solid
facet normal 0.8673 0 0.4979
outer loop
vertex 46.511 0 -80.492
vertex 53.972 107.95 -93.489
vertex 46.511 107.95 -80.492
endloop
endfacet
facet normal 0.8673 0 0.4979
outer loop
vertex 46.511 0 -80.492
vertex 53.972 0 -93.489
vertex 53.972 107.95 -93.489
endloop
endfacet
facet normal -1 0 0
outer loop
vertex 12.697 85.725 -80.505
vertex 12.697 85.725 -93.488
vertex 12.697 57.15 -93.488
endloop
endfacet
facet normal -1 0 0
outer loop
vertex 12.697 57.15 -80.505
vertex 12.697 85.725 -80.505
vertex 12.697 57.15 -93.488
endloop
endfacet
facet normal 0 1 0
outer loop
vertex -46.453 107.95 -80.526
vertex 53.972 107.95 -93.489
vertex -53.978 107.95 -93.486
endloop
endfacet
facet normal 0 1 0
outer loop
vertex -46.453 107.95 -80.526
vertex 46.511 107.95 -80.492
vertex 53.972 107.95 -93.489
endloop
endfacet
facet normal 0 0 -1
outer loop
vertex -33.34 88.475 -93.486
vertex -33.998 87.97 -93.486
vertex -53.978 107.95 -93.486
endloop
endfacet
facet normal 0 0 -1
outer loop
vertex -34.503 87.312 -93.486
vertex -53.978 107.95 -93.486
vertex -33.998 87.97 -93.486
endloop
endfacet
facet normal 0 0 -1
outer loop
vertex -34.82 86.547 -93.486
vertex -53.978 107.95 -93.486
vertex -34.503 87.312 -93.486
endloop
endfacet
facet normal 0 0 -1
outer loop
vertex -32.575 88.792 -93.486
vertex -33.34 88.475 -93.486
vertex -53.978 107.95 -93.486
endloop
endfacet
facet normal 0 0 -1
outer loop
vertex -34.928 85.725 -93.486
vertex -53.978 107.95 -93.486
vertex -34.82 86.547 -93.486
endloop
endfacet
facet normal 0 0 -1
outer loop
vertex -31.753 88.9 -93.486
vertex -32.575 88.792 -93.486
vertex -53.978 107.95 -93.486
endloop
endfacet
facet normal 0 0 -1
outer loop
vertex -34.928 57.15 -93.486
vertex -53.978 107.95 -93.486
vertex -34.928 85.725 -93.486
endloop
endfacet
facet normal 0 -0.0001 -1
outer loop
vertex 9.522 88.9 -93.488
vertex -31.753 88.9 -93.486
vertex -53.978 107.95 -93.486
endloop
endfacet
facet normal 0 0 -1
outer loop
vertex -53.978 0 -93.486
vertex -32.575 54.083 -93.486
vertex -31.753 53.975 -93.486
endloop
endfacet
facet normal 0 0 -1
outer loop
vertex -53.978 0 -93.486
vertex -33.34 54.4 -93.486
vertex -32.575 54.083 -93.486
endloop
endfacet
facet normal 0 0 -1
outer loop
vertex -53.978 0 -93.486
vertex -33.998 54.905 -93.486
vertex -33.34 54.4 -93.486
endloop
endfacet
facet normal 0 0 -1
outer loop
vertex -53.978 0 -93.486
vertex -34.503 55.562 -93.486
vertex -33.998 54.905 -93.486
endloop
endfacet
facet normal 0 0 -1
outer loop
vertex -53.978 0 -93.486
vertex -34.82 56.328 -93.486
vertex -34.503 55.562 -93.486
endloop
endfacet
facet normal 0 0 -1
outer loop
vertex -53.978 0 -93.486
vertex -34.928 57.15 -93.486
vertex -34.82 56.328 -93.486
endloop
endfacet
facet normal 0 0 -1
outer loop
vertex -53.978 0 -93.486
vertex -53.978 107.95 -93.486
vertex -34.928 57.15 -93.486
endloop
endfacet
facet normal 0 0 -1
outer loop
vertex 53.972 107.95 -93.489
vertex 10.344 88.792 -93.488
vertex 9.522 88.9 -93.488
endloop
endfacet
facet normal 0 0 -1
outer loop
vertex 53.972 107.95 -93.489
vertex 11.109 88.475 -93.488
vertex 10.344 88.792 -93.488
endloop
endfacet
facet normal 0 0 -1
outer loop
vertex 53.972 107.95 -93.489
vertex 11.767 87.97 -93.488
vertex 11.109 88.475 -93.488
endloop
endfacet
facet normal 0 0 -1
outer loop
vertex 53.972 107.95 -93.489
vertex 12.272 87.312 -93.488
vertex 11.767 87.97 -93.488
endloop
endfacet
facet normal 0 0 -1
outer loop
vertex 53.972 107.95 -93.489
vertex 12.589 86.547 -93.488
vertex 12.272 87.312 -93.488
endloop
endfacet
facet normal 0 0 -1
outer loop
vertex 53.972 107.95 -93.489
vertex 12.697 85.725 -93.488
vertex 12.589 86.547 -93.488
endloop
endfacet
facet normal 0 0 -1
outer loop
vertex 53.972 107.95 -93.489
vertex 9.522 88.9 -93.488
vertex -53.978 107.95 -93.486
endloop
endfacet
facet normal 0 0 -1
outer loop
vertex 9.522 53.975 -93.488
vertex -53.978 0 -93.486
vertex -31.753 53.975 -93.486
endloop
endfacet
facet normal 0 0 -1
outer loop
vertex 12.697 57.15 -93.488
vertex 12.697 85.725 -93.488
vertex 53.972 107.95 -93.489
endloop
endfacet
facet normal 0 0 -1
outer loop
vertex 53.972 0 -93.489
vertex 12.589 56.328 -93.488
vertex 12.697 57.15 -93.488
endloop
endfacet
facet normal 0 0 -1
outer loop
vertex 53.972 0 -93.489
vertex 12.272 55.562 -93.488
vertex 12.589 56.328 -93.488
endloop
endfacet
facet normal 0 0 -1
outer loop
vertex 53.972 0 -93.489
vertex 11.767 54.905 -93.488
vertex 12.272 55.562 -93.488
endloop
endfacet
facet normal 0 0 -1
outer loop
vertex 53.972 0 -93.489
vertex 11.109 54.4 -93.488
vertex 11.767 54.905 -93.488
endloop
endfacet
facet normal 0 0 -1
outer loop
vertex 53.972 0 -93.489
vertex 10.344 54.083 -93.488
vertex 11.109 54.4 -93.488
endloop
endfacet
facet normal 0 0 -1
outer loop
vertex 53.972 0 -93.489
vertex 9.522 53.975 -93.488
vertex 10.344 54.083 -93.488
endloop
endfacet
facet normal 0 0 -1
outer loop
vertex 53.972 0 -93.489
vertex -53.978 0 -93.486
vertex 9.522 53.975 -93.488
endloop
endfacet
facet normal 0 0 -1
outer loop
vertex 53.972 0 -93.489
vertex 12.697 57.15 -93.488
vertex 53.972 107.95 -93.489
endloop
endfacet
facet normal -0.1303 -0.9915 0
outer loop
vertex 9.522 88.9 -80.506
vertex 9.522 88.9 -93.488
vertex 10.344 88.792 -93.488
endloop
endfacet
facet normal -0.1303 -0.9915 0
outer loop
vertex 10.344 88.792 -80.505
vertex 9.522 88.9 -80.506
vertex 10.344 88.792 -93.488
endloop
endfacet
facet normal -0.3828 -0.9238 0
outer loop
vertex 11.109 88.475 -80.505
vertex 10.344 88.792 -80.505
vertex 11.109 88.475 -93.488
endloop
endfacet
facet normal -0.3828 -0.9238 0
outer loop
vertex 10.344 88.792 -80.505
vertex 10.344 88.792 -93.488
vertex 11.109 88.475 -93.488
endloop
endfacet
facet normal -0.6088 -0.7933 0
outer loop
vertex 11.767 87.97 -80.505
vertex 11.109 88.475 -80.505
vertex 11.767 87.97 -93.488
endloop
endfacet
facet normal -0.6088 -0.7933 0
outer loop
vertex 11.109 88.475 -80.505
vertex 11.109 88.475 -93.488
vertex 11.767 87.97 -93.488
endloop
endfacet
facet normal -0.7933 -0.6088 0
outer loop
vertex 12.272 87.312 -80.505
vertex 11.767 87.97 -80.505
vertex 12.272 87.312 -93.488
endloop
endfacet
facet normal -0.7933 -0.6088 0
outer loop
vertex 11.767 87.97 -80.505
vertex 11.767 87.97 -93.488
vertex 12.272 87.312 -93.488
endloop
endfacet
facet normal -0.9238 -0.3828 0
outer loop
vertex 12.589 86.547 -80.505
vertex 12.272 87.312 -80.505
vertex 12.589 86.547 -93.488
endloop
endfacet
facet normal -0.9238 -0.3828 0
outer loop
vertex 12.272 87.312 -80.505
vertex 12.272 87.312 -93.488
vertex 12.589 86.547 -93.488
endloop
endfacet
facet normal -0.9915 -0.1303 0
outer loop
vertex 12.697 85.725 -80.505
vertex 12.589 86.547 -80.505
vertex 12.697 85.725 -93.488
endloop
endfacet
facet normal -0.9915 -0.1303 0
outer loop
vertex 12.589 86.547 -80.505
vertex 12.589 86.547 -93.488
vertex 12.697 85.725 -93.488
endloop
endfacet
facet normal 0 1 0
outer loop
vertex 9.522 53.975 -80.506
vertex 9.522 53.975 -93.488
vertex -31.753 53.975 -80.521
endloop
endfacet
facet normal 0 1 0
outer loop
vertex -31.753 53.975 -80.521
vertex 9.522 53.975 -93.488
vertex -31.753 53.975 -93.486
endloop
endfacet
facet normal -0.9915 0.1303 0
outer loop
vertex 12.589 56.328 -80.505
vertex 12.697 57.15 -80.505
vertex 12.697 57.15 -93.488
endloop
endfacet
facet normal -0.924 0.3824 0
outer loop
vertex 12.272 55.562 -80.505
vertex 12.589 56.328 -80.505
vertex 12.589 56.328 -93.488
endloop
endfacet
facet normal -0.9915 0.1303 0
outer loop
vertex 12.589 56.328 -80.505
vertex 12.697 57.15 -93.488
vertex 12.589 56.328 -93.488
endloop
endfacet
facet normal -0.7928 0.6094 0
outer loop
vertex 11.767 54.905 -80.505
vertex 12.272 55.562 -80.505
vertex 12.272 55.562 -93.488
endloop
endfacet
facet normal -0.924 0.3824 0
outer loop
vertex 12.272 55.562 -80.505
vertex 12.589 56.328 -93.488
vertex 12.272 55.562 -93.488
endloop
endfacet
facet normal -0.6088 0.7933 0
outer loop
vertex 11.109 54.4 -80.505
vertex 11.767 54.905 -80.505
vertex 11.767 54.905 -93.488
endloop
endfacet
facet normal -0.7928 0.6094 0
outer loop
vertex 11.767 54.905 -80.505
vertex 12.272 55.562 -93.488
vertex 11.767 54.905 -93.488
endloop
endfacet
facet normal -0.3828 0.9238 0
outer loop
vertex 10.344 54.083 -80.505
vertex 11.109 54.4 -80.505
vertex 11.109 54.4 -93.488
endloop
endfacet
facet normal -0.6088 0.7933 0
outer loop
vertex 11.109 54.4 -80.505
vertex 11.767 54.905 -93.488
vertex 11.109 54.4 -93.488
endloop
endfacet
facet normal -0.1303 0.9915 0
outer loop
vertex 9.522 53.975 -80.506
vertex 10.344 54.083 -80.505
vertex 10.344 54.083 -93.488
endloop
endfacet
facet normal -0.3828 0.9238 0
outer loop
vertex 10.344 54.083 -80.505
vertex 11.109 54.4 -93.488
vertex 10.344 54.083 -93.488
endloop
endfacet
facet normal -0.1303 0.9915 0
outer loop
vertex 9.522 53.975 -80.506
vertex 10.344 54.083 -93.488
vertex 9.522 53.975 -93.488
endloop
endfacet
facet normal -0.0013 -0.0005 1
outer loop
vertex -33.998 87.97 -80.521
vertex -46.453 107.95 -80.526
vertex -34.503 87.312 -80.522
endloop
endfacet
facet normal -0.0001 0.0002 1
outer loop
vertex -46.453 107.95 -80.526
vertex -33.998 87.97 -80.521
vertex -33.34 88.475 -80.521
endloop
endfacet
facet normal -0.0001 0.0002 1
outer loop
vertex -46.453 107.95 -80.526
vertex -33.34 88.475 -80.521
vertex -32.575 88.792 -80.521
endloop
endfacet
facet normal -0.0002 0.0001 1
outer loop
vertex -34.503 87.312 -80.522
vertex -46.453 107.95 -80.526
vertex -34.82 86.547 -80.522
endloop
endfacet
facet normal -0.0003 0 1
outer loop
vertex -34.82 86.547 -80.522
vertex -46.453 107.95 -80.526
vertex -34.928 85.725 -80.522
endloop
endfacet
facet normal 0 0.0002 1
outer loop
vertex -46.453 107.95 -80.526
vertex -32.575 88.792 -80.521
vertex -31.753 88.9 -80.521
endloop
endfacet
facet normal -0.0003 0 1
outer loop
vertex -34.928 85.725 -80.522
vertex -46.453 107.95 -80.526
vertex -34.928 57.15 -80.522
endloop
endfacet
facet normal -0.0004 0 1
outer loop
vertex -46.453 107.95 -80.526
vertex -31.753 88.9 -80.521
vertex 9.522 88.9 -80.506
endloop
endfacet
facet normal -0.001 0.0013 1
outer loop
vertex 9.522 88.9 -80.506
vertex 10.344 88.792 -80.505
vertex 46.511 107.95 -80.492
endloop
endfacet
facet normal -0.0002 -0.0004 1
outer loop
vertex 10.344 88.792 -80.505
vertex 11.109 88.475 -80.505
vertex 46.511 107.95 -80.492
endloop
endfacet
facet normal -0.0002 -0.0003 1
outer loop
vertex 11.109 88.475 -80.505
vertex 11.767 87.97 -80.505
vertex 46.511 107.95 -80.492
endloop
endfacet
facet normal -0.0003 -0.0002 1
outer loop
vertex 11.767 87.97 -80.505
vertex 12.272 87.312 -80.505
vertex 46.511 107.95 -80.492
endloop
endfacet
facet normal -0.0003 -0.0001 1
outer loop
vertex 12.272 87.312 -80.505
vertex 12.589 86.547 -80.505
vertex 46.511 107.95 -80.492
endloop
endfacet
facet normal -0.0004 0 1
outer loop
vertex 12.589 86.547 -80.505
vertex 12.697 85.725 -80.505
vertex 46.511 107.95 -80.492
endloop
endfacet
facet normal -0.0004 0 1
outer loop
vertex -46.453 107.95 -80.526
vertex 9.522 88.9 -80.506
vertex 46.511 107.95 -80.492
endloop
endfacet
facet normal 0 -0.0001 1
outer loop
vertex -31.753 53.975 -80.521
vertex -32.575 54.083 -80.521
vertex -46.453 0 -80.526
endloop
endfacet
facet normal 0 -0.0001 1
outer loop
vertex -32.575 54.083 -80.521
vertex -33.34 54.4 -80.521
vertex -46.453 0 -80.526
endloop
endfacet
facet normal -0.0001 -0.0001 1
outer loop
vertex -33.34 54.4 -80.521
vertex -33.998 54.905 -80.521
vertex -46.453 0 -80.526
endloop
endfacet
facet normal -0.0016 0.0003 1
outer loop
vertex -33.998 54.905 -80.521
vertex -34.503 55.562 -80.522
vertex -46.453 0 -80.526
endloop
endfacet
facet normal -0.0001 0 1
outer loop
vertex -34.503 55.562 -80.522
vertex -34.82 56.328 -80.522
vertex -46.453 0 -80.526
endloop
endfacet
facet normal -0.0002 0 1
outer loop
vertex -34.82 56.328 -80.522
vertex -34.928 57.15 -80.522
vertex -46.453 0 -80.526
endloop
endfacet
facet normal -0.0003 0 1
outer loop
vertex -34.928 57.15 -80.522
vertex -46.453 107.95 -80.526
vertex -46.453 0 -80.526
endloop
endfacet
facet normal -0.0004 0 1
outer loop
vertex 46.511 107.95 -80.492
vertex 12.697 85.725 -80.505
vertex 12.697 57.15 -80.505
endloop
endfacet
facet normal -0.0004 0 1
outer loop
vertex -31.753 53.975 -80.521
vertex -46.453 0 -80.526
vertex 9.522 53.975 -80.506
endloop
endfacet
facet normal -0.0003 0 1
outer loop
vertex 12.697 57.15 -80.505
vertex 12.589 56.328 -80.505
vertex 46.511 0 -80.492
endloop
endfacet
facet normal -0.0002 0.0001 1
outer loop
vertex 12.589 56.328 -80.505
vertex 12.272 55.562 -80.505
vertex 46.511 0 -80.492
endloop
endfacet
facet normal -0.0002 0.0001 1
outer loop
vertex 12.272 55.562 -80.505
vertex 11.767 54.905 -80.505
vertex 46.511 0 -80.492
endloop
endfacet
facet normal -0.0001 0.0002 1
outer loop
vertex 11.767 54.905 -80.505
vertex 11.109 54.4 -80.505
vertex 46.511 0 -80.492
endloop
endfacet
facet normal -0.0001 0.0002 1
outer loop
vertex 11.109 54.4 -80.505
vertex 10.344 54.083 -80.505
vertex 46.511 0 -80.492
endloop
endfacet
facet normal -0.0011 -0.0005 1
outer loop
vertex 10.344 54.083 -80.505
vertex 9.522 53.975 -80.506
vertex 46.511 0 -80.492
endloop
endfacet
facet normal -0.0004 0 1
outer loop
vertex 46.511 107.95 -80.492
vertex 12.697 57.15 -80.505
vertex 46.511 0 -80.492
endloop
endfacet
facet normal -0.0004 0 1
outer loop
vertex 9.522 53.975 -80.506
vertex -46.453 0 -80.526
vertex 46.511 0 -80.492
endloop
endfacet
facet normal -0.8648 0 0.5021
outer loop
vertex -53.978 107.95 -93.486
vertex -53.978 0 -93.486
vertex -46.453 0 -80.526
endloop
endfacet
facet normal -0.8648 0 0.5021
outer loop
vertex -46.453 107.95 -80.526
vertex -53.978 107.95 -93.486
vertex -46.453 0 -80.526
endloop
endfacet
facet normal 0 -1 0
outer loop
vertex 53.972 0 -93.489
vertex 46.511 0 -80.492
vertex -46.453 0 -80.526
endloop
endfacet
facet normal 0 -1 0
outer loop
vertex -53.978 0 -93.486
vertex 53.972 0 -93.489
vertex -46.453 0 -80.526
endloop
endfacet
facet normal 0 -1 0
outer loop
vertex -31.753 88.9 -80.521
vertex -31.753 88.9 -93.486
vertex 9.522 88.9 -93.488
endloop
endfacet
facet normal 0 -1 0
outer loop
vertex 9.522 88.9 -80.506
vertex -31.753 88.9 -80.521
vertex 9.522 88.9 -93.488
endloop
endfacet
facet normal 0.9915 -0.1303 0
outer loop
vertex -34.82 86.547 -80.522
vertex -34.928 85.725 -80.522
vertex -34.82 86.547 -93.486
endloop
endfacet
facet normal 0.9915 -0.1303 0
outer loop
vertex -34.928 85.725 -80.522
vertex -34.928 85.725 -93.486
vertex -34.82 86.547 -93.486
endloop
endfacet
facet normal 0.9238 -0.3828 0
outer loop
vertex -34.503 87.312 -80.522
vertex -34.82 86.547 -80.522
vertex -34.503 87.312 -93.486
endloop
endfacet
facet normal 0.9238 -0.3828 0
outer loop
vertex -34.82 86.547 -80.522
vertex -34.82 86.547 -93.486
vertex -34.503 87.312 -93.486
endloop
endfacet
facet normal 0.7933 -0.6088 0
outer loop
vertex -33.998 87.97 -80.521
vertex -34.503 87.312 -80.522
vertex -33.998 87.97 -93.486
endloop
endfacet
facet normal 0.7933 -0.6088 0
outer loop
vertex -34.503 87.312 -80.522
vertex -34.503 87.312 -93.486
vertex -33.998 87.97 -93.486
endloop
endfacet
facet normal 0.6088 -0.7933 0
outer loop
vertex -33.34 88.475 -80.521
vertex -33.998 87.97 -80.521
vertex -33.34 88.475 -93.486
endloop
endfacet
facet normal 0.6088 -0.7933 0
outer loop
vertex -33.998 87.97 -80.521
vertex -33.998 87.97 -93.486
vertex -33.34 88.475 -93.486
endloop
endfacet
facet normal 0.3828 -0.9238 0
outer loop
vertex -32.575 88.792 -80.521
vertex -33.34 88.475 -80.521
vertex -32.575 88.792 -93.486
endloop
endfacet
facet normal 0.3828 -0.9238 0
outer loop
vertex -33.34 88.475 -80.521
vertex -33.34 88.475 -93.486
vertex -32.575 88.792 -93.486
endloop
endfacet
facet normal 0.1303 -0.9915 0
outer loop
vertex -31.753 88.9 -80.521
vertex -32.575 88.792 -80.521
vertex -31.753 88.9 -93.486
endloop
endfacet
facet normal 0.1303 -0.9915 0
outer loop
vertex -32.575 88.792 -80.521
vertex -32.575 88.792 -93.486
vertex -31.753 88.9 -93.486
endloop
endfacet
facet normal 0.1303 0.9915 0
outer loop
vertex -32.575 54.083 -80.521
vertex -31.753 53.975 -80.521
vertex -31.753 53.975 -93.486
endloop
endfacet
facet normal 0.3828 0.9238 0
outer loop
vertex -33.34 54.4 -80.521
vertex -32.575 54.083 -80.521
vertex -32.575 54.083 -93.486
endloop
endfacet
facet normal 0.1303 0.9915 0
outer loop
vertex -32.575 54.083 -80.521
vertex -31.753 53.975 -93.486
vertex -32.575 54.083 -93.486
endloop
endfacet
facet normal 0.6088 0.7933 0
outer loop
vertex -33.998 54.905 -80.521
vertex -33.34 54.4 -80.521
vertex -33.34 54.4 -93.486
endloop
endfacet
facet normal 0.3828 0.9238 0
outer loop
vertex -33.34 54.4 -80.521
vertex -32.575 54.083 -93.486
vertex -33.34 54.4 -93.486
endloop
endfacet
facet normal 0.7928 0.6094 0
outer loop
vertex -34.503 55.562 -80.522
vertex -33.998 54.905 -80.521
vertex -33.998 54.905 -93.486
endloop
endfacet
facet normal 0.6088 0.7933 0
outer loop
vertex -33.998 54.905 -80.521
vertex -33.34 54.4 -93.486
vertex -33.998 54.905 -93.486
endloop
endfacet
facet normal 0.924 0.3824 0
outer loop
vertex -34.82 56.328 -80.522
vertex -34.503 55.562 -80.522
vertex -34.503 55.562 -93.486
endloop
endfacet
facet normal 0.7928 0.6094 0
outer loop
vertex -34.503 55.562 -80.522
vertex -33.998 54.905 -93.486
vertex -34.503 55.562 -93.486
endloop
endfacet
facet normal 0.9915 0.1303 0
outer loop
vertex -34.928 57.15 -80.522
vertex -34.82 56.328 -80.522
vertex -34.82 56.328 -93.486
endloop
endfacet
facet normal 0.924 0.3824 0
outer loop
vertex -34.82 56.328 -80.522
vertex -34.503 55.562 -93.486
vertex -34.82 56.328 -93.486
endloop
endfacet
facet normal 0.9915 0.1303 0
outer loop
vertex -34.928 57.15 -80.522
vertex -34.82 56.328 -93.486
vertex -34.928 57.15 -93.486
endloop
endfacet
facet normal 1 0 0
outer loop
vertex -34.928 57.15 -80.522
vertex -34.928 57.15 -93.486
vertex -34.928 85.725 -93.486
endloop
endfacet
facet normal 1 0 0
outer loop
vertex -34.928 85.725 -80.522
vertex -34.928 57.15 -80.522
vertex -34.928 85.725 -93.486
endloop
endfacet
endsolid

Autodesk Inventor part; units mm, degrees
ref_plane "YZ Plane" through (0, 0, 0) normal (1, 0, 0) x (0, 1, 0)
ref_plane "XZ Plane" through (0, 0, 0) normal (0, 1, 0) x (-1, 0, 0)
ref_plane "XY Plane" through (0, 0, 0) normal (0, 0, 1) x (1, 0, 0)
sketch "Sketch1" plane through (0, 0, 0) normal (0, 1, 0) x (-1, 0, 0)
  line L0 (-107.95, -0.0035) -> (-53.978, 93.4857)
  line L1 (-53.978, 93.4857) -> (53.972, 93.4892)
  line L2 (53.972, 93.4892) -> (107.95, 0.0035)
  line L3 (107.95, 0.0035) -> (53.978, -93.4857)
  line L4 (53.978, -93.4857) -> (-53.972, -93.4892)
  line L5 (-53.972, -93.4892) -> (-107.95, -0.0035)
  line L6 (-92.964, 0.0336) -> (-46.4529, 80.526)
  line L7 (-46.4529, 80.526) -> (46.5111, 80.4924)
  line L8 (46.5111, 80.4924) -> (92.964, -0.0336)
  line L9 (92.964, -0.0336) -> (46.4529, -80.526)
  line L10 (46.4529, -80.526) -> (-46.5111, -80.4924)
  line L11 (-46.5111, -80.4924) -> (-92.964, 0.0336)
  line L12 (53.978, -93.4857) -> (46.4529, -80.526)
  line L13 (-53.972, -93.4892) -> (-46.5111, -80.4924)
  point P0 (0, 0)
  point P1 (0, 0)
  point P2 (0, 0)
  point P3 (0, 0)
  dimension "d0" = 215.9
  dimension "d1" = 14.986
extrude "Extrusion1" add sketch "Sketch1" along normal blind 107.95 contours L13 L10 L12 L4
sketch "Sketch2" plane through (53.972, 0, -93.4892) normal (0, 0, -1) x (-1, 0, 0)
  line L0 (85.725, 88.9) -> (44.45, 88.9)
  line L1 (41.275, 85.725) -> (41.275, 57.15)
  line L2 (44.45, 53.975) -> (85.725, 53.975)
  line L3 (88.9, 57.15) -> (88.9, 85.725)
  line L4 (107.95, 0) -> (107.95, 107.95) projected
  line L5 (0, 107.95) -> (107.95, 107.95) projected
  arc A0 (44.45, 88.9) -> (41.275, 85.725) centre (44.45, 85.725) ccw
  arc A1 (88.9, 85.725) -> (85.725, 88.9) centre (85.725, 85.725) ccw
  arc A2 (41.275, 57.15) -> (44.45, 53.975) centre (44.45, 57.15) ccw
  arc A3 (85.725, 53.975) -> (88.9, 57.15) centre (85.725, 57.15) ccw
  point P0 (53.975, 0)
  point P1 (41.275, 53.975)
  point P2 (41.275, 88.9)
  point P3 (88.9, 53.975)
  dimension "d4" = 47.625
  dimension "d5" = 34.925
  dimension "d6" = 19.05
  dimension "d7" = 19.05
  dimension "d8" = 3.175
extrude "Extrusion2" cut sketch "Sketch2" against normal up to surface (12.9994 mm away)
properties part number "SatelliteSideWallCamera_v2"
